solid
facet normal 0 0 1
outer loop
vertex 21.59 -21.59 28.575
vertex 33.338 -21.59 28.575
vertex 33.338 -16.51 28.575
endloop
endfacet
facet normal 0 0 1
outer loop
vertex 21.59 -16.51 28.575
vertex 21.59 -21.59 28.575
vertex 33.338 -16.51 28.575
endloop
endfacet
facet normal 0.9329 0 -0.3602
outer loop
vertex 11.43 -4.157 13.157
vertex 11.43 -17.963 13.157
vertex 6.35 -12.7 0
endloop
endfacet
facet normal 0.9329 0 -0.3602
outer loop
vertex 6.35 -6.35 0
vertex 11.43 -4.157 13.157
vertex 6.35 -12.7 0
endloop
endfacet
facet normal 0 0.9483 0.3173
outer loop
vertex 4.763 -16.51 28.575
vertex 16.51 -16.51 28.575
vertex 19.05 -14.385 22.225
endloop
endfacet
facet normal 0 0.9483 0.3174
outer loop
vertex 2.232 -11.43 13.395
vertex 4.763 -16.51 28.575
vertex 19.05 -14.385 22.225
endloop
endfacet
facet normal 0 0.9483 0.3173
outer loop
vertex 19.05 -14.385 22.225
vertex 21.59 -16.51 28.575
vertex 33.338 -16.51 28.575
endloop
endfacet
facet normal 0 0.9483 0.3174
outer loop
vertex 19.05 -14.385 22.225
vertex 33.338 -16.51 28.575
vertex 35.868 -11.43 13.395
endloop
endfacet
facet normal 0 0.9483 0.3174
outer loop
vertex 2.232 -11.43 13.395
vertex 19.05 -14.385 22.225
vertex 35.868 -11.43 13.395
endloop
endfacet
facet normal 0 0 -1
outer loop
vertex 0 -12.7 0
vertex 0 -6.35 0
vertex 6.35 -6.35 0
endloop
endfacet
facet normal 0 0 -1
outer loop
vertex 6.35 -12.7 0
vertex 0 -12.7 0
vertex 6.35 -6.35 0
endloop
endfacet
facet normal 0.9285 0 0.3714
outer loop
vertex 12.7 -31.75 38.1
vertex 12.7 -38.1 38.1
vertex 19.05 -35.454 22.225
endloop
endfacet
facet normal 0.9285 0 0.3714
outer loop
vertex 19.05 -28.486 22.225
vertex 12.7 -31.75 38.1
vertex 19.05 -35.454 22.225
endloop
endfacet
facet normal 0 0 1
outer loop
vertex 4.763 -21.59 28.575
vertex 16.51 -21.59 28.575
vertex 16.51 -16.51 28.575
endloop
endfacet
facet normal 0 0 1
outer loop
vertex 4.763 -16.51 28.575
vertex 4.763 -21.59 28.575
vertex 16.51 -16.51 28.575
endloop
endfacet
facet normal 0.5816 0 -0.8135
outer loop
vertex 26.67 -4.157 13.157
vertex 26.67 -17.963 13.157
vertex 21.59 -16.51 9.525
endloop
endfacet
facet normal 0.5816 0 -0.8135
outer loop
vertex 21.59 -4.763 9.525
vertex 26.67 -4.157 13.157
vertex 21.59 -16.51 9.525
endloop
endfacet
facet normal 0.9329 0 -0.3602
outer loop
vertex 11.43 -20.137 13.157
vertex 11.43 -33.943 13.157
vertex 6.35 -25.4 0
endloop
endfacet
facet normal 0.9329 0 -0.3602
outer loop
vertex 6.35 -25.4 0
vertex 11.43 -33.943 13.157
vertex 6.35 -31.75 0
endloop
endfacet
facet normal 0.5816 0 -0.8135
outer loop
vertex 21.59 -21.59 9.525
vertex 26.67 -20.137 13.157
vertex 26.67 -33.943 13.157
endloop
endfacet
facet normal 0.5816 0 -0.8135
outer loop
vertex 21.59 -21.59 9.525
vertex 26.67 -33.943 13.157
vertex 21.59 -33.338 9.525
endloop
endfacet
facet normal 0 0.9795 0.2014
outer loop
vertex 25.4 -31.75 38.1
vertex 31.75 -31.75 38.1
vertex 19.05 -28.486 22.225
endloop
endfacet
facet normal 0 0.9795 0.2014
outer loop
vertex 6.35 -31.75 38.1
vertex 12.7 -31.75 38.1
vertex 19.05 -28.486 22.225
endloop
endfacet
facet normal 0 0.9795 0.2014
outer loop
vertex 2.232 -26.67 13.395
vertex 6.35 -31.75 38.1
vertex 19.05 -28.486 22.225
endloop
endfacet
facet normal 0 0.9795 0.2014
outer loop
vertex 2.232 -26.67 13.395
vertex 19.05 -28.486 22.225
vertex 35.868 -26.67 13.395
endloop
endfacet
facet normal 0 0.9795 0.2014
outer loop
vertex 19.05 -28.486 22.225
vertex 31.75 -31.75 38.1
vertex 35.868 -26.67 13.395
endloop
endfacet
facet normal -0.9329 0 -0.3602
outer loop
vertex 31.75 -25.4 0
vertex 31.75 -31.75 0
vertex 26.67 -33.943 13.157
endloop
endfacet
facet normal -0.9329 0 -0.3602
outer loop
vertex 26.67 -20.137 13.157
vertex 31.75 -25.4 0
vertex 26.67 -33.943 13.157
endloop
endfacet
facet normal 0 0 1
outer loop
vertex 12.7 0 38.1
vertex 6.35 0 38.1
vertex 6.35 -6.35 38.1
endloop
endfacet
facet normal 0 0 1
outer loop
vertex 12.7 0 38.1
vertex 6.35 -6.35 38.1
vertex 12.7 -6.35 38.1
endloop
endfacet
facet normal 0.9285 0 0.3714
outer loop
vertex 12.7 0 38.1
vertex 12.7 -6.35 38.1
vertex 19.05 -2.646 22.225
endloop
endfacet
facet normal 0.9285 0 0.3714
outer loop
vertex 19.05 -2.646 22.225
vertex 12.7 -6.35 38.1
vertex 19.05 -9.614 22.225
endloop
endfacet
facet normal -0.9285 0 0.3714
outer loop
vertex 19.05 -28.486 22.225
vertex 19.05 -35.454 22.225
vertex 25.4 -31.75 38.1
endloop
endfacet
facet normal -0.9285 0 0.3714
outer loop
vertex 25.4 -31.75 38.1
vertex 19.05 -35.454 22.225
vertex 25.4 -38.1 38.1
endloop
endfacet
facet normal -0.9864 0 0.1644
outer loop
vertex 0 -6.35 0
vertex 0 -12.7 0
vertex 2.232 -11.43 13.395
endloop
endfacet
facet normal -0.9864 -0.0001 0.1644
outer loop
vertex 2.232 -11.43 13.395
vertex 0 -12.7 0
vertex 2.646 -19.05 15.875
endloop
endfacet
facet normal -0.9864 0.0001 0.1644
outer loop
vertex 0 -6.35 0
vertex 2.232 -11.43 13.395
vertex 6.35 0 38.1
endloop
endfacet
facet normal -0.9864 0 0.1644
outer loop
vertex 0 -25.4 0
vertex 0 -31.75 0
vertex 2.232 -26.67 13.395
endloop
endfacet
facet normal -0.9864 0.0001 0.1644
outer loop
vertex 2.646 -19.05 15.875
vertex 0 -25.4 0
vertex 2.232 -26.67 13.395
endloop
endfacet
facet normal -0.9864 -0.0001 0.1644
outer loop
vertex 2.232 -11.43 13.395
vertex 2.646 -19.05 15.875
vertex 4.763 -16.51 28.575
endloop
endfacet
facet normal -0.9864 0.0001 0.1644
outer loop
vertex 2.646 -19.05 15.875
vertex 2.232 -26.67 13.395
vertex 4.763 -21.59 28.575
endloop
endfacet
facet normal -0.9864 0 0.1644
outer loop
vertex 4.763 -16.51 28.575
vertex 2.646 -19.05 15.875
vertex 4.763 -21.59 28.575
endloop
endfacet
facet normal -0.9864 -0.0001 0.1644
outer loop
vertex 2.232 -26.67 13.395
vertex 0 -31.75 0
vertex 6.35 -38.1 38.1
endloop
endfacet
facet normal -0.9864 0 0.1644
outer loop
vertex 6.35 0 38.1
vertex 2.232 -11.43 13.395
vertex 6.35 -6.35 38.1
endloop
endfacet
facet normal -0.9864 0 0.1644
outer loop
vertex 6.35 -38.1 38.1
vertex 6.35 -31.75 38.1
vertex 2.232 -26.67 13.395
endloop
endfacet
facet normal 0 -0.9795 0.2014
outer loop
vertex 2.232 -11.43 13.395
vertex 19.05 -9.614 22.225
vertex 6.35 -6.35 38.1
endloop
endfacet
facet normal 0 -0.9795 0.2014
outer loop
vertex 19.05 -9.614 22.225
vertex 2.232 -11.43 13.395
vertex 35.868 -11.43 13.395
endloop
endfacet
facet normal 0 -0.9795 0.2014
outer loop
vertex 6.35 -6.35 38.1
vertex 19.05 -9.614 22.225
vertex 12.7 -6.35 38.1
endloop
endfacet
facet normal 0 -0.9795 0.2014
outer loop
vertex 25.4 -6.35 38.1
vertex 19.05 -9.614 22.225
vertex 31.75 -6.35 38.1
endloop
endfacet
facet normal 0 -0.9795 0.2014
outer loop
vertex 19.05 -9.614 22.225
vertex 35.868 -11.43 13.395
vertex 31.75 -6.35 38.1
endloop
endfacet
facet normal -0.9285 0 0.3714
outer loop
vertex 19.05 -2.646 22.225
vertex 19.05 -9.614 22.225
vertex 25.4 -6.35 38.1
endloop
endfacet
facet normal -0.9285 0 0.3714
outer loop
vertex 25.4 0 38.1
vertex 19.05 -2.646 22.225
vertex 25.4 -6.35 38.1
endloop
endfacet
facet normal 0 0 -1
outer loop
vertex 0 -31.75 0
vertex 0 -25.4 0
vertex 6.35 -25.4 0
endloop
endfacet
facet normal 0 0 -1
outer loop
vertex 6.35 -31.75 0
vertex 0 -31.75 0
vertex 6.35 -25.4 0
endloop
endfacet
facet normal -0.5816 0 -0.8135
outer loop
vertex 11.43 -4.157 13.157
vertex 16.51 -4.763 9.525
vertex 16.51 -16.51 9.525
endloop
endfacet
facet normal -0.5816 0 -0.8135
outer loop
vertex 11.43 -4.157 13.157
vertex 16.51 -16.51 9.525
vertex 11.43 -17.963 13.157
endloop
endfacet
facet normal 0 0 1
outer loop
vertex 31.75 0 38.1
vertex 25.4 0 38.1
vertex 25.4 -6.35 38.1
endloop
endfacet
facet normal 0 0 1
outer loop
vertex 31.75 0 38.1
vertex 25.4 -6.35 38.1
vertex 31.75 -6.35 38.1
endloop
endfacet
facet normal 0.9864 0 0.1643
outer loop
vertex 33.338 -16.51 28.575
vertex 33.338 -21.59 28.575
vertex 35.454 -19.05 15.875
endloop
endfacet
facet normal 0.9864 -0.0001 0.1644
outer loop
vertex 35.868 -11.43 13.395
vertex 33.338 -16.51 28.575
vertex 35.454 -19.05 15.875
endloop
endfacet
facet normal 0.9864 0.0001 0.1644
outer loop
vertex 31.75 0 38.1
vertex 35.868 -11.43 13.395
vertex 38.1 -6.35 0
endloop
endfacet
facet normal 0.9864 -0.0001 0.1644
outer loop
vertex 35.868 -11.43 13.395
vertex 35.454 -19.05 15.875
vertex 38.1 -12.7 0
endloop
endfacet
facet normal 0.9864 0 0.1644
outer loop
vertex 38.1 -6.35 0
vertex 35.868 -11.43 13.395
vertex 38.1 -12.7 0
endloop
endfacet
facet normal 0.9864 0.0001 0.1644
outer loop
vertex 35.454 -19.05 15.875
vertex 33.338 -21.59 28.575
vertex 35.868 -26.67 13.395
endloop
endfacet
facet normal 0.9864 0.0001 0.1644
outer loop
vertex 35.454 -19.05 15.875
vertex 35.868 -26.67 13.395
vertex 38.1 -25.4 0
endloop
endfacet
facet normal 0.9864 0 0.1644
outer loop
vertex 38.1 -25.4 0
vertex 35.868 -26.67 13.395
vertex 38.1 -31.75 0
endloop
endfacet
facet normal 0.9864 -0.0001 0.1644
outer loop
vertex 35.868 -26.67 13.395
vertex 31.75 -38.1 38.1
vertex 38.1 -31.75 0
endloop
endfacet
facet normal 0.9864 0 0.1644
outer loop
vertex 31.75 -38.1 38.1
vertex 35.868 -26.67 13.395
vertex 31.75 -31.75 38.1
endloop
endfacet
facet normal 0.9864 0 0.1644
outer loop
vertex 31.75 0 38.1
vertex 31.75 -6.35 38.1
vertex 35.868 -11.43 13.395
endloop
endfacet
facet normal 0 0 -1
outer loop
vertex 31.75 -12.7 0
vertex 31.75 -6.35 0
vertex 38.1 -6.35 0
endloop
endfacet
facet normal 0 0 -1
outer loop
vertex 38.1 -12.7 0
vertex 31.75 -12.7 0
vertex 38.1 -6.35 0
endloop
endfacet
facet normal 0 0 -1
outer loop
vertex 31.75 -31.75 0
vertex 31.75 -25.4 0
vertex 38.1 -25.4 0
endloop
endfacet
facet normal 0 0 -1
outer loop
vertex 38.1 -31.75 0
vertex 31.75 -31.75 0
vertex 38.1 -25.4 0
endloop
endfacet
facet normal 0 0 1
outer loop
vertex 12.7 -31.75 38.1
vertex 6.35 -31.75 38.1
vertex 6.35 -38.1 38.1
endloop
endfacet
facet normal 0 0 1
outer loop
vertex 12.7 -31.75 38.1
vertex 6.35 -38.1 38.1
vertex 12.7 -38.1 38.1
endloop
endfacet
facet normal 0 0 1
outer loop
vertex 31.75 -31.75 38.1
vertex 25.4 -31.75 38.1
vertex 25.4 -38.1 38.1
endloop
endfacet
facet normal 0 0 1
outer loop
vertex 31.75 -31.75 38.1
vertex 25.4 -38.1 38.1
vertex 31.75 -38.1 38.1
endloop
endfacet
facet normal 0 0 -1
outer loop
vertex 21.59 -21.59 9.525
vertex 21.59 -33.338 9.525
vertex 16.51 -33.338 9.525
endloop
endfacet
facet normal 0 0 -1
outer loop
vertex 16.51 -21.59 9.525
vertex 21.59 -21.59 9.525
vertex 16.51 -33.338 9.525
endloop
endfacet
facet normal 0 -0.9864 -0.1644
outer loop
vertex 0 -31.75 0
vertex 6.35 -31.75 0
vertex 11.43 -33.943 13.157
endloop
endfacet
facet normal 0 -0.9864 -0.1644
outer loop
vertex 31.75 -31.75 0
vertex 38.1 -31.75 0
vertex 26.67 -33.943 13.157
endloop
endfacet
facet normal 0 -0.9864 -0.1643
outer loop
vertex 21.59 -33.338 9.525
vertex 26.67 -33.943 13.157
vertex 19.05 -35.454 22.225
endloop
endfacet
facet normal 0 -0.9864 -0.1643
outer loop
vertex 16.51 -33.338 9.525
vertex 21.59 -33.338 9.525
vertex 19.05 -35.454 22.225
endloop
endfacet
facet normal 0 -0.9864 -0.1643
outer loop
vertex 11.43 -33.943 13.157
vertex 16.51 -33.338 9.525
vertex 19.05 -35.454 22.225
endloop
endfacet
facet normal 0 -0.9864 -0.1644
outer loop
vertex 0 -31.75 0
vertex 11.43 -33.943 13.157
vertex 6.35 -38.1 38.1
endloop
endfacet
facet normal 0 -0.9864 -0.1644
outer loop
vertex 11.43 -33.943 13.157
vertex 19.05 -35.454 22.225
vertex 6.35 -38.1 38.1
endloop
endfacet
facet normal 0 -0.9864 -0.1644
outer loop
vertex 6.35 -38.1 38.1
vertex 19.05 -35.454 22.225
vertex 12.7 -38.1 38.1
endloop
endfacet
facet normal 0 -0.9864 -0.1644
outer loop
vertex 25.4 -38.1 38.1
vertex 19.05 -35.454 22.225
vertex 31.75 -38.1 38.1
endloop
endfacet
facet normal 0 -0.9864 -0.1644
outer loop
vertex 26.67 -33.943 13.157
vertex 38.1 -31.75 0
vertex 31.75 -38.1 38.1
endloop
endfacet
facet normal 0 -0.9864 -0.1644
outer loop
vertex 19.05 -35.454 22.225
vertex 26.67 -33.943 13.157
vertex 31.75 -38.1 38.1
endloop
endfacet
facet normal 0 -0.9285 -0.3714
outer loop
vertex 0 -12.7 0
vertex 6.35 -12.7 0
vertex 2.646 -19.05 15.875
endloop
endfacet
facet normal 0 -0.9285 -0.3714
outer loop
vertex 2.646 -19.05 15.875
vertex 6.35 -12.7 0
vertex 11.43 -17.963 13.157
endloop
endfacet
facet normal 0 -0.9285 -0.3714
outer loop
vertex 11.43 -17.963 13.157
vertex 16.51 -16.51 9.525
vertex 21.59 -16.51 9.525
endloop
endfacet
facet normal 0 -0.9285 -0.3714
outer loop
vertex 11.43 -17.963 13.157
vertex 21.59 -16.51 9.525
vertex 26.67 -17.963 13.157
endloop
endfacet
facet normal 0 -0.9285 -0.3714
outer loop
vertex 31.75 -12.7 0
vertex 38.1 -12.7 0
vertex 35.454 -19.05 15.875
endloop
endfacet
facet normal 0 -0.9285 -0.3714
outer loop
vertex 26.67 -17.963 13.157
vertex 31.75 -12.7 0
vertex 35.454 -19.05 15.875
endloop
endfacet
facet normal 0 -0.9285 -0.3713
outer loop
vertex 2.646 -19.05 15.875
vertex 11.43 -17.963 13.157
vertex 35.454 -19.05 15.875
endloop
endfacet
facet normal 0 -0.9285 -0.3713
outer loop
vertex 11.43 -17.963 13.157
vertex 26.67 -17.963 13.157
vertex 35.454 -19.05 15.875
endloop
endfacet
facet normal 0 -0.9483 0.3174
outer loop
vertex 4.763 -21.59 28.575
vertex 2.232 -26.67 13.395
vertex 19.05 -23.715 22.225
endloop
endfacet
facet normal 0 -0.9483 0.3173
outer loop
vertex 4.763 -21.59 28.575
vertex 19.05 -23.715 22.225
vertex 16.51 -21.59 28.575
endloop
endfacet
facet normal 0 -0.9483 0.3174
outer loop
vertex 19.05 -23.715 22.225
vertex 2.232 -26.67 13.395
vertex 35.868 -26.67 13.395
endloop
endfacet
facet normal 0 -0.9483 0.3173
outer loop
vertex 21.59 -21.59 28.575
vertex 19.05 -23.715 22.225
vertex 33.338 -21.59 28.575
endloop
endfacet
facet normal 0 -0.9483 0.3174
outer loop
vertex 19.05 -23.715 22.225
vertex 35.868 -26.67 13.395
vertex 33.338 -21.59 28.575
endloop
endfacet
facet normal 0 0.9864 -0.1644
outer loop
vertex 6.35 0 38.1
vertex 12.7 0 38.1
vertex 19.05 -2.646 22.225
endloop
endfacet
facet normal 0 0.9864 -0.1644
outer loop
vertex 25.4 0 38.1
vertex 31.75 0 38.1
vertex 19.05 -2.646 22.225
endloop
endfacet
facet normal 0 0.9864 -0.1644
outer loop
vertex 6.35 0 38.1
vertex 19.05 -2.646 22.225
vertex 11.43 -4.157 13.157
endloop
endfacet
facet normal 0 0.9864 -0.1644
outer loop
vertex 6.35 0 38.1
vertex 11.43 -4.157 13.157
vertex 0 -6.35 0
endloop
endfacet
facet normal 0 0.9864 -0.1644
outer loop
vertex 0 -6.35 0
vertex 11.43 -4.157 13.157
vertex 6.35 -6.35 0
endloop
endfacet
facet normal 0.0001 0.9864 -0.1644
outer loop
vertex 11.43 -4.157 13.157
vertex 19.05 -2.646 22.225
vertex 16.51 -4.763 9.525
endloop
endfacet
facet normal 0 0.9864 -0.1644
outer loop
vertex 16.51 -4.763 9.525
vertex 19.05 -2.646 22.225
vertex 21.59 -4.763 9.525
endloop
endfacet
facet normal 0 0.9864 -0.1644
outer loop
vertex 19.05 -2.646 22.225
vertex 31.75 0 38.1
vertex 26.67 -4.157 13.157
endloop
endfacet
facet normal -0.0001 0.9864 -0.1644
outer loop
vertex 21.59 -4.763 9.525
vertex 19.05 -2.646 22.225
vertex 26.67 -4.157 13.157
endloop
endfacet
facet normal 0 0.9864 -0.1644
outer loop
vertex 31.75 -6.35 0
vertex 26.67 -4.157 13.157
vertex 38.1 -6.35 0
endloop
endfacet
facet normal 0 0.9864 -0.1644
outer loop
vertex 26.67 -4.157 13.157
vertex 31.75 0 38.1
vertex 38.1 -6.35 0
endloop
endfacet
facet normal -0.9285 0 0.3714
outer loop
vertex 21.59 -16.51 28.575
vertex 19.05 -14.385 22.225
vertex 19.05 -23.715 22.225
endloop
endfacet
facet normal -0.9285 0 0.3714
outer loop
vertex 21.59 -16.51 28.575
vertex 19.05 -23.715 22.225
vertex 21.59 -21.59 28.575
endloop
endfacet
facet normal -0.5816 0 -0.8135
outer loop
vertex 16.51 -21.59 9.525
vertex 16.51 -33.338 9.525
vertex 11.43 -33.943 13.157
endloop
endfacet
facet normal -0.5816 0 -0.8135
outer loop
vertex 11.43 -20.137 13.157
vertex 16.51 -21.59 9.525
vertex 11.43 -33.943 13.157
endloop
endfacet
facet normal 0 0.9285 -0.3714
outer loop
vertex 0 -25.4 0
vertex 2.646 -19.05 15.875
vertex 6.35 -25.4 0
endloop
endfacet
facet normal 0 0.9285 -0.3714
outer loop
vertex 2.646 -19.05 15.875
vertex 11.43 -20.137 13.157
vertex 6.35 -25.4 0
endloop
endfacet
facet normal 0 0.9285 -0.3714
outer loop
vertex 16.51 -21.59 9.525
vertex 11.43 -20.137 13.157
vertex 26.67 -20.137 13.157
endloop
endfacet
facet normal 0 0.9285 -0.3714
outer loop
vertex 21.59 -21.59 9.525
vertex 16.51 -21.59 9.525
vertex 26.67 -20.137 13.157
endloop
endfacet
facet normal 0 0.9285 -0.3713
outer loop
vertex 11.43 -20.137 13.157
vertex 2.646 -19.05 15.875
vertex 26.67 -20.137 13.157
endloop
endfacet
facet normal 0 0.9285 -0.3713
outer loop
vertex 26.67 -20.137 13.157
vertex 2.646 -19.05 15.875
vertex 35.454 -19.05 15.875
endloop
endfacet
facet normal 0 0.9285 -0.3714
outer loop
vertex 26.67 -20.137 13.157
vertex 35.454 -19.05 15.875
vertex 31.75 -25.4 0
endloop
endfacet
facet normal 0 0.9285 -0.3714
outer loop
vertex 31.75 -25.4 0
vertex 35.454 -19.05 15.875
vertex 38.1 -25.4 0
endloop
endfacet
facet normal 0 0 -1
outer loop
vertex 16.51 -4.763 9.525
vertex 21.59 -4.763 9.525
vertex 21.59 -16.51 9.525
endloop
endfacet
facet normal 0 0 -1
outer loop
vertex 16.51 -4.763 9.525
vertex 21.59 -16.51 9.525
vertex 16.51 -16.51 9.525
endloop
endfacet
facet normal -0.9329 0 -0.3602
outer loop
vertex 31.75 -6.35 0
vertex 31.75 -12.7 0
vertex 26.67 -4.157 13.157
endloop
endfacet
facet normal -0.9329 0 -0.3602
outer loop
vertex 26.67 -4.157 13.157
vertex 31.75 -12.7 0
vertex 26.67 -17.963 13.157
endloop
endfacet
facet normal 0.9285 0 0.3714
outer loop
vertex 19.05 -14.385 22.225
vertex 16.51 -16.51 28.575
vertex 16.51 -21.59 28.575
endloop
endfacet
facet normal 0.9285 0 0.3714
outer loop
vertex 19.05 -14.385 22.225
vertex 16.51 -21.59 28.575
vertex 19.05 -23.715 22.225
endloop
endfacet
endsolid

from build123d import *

# Parameters (mm, degrees)
F0_W     = 38.1
F0_H     = 38.1
F1_DEPTH = 38.1
F5_DEPTH = 38.1
F7_DEPTH = 38.1


with BuildPart() as f1:
    # F0 (on Front) → F1 (new body)
    with BuildSketch(Plane.XZ):
        with Locations((19.05, 19.05)):
            Rectangle(F0_W, F0_H)
    extrude(amount=F1_DEPTH)

    # F4 (on offset) → F5 (cut)
    with BuildSketch(Plane.YZ.offset(38.1)):
        Polygon((-6.35, 38.1), (-31.75, 38.1), (-26.67, 13.394677), (-21.59, 28.575), (-16.51, 28.575), (-11.43, 13.394677), align=None)
        Polygon((-19.05, 15.875), (-25.4, 0), (-12.7, 0), align=None)
        Polygon((-31.75, 0), (-38.1, 38.1), (-38.1, 0), align=None)
        Polygon((0, 0), (0, 38.1), (-6.35, 0), align=None)
    extrude(amount=-F5_DEPTH, mode=Mode.SUBTRACT)

    # F6 (on offset) → F7 (cut)
    with BuildSketch(Plane.XZ.offset(38.1)):
        Polygon((11.43, 13.156833), (6.35, 0), (31.75, 0), (26.67, 13.156833), (21.59, 9.525), (16.51, 9.525), align=None)
        Polygon((25.4, 38.1), (12.7, 38.1), (19.05, 22.225), align=None)
        Polygon((0, 38.1), (0, 0), (6.35, 38.1), align=None)
        Polygon((31.75, 38.1), (38.1, 0), (38.1, 38.1), align=None)
    extrude(amount=-F7_DEPTH, mode=Mode.SUBTRACT)


solid = f1.part
